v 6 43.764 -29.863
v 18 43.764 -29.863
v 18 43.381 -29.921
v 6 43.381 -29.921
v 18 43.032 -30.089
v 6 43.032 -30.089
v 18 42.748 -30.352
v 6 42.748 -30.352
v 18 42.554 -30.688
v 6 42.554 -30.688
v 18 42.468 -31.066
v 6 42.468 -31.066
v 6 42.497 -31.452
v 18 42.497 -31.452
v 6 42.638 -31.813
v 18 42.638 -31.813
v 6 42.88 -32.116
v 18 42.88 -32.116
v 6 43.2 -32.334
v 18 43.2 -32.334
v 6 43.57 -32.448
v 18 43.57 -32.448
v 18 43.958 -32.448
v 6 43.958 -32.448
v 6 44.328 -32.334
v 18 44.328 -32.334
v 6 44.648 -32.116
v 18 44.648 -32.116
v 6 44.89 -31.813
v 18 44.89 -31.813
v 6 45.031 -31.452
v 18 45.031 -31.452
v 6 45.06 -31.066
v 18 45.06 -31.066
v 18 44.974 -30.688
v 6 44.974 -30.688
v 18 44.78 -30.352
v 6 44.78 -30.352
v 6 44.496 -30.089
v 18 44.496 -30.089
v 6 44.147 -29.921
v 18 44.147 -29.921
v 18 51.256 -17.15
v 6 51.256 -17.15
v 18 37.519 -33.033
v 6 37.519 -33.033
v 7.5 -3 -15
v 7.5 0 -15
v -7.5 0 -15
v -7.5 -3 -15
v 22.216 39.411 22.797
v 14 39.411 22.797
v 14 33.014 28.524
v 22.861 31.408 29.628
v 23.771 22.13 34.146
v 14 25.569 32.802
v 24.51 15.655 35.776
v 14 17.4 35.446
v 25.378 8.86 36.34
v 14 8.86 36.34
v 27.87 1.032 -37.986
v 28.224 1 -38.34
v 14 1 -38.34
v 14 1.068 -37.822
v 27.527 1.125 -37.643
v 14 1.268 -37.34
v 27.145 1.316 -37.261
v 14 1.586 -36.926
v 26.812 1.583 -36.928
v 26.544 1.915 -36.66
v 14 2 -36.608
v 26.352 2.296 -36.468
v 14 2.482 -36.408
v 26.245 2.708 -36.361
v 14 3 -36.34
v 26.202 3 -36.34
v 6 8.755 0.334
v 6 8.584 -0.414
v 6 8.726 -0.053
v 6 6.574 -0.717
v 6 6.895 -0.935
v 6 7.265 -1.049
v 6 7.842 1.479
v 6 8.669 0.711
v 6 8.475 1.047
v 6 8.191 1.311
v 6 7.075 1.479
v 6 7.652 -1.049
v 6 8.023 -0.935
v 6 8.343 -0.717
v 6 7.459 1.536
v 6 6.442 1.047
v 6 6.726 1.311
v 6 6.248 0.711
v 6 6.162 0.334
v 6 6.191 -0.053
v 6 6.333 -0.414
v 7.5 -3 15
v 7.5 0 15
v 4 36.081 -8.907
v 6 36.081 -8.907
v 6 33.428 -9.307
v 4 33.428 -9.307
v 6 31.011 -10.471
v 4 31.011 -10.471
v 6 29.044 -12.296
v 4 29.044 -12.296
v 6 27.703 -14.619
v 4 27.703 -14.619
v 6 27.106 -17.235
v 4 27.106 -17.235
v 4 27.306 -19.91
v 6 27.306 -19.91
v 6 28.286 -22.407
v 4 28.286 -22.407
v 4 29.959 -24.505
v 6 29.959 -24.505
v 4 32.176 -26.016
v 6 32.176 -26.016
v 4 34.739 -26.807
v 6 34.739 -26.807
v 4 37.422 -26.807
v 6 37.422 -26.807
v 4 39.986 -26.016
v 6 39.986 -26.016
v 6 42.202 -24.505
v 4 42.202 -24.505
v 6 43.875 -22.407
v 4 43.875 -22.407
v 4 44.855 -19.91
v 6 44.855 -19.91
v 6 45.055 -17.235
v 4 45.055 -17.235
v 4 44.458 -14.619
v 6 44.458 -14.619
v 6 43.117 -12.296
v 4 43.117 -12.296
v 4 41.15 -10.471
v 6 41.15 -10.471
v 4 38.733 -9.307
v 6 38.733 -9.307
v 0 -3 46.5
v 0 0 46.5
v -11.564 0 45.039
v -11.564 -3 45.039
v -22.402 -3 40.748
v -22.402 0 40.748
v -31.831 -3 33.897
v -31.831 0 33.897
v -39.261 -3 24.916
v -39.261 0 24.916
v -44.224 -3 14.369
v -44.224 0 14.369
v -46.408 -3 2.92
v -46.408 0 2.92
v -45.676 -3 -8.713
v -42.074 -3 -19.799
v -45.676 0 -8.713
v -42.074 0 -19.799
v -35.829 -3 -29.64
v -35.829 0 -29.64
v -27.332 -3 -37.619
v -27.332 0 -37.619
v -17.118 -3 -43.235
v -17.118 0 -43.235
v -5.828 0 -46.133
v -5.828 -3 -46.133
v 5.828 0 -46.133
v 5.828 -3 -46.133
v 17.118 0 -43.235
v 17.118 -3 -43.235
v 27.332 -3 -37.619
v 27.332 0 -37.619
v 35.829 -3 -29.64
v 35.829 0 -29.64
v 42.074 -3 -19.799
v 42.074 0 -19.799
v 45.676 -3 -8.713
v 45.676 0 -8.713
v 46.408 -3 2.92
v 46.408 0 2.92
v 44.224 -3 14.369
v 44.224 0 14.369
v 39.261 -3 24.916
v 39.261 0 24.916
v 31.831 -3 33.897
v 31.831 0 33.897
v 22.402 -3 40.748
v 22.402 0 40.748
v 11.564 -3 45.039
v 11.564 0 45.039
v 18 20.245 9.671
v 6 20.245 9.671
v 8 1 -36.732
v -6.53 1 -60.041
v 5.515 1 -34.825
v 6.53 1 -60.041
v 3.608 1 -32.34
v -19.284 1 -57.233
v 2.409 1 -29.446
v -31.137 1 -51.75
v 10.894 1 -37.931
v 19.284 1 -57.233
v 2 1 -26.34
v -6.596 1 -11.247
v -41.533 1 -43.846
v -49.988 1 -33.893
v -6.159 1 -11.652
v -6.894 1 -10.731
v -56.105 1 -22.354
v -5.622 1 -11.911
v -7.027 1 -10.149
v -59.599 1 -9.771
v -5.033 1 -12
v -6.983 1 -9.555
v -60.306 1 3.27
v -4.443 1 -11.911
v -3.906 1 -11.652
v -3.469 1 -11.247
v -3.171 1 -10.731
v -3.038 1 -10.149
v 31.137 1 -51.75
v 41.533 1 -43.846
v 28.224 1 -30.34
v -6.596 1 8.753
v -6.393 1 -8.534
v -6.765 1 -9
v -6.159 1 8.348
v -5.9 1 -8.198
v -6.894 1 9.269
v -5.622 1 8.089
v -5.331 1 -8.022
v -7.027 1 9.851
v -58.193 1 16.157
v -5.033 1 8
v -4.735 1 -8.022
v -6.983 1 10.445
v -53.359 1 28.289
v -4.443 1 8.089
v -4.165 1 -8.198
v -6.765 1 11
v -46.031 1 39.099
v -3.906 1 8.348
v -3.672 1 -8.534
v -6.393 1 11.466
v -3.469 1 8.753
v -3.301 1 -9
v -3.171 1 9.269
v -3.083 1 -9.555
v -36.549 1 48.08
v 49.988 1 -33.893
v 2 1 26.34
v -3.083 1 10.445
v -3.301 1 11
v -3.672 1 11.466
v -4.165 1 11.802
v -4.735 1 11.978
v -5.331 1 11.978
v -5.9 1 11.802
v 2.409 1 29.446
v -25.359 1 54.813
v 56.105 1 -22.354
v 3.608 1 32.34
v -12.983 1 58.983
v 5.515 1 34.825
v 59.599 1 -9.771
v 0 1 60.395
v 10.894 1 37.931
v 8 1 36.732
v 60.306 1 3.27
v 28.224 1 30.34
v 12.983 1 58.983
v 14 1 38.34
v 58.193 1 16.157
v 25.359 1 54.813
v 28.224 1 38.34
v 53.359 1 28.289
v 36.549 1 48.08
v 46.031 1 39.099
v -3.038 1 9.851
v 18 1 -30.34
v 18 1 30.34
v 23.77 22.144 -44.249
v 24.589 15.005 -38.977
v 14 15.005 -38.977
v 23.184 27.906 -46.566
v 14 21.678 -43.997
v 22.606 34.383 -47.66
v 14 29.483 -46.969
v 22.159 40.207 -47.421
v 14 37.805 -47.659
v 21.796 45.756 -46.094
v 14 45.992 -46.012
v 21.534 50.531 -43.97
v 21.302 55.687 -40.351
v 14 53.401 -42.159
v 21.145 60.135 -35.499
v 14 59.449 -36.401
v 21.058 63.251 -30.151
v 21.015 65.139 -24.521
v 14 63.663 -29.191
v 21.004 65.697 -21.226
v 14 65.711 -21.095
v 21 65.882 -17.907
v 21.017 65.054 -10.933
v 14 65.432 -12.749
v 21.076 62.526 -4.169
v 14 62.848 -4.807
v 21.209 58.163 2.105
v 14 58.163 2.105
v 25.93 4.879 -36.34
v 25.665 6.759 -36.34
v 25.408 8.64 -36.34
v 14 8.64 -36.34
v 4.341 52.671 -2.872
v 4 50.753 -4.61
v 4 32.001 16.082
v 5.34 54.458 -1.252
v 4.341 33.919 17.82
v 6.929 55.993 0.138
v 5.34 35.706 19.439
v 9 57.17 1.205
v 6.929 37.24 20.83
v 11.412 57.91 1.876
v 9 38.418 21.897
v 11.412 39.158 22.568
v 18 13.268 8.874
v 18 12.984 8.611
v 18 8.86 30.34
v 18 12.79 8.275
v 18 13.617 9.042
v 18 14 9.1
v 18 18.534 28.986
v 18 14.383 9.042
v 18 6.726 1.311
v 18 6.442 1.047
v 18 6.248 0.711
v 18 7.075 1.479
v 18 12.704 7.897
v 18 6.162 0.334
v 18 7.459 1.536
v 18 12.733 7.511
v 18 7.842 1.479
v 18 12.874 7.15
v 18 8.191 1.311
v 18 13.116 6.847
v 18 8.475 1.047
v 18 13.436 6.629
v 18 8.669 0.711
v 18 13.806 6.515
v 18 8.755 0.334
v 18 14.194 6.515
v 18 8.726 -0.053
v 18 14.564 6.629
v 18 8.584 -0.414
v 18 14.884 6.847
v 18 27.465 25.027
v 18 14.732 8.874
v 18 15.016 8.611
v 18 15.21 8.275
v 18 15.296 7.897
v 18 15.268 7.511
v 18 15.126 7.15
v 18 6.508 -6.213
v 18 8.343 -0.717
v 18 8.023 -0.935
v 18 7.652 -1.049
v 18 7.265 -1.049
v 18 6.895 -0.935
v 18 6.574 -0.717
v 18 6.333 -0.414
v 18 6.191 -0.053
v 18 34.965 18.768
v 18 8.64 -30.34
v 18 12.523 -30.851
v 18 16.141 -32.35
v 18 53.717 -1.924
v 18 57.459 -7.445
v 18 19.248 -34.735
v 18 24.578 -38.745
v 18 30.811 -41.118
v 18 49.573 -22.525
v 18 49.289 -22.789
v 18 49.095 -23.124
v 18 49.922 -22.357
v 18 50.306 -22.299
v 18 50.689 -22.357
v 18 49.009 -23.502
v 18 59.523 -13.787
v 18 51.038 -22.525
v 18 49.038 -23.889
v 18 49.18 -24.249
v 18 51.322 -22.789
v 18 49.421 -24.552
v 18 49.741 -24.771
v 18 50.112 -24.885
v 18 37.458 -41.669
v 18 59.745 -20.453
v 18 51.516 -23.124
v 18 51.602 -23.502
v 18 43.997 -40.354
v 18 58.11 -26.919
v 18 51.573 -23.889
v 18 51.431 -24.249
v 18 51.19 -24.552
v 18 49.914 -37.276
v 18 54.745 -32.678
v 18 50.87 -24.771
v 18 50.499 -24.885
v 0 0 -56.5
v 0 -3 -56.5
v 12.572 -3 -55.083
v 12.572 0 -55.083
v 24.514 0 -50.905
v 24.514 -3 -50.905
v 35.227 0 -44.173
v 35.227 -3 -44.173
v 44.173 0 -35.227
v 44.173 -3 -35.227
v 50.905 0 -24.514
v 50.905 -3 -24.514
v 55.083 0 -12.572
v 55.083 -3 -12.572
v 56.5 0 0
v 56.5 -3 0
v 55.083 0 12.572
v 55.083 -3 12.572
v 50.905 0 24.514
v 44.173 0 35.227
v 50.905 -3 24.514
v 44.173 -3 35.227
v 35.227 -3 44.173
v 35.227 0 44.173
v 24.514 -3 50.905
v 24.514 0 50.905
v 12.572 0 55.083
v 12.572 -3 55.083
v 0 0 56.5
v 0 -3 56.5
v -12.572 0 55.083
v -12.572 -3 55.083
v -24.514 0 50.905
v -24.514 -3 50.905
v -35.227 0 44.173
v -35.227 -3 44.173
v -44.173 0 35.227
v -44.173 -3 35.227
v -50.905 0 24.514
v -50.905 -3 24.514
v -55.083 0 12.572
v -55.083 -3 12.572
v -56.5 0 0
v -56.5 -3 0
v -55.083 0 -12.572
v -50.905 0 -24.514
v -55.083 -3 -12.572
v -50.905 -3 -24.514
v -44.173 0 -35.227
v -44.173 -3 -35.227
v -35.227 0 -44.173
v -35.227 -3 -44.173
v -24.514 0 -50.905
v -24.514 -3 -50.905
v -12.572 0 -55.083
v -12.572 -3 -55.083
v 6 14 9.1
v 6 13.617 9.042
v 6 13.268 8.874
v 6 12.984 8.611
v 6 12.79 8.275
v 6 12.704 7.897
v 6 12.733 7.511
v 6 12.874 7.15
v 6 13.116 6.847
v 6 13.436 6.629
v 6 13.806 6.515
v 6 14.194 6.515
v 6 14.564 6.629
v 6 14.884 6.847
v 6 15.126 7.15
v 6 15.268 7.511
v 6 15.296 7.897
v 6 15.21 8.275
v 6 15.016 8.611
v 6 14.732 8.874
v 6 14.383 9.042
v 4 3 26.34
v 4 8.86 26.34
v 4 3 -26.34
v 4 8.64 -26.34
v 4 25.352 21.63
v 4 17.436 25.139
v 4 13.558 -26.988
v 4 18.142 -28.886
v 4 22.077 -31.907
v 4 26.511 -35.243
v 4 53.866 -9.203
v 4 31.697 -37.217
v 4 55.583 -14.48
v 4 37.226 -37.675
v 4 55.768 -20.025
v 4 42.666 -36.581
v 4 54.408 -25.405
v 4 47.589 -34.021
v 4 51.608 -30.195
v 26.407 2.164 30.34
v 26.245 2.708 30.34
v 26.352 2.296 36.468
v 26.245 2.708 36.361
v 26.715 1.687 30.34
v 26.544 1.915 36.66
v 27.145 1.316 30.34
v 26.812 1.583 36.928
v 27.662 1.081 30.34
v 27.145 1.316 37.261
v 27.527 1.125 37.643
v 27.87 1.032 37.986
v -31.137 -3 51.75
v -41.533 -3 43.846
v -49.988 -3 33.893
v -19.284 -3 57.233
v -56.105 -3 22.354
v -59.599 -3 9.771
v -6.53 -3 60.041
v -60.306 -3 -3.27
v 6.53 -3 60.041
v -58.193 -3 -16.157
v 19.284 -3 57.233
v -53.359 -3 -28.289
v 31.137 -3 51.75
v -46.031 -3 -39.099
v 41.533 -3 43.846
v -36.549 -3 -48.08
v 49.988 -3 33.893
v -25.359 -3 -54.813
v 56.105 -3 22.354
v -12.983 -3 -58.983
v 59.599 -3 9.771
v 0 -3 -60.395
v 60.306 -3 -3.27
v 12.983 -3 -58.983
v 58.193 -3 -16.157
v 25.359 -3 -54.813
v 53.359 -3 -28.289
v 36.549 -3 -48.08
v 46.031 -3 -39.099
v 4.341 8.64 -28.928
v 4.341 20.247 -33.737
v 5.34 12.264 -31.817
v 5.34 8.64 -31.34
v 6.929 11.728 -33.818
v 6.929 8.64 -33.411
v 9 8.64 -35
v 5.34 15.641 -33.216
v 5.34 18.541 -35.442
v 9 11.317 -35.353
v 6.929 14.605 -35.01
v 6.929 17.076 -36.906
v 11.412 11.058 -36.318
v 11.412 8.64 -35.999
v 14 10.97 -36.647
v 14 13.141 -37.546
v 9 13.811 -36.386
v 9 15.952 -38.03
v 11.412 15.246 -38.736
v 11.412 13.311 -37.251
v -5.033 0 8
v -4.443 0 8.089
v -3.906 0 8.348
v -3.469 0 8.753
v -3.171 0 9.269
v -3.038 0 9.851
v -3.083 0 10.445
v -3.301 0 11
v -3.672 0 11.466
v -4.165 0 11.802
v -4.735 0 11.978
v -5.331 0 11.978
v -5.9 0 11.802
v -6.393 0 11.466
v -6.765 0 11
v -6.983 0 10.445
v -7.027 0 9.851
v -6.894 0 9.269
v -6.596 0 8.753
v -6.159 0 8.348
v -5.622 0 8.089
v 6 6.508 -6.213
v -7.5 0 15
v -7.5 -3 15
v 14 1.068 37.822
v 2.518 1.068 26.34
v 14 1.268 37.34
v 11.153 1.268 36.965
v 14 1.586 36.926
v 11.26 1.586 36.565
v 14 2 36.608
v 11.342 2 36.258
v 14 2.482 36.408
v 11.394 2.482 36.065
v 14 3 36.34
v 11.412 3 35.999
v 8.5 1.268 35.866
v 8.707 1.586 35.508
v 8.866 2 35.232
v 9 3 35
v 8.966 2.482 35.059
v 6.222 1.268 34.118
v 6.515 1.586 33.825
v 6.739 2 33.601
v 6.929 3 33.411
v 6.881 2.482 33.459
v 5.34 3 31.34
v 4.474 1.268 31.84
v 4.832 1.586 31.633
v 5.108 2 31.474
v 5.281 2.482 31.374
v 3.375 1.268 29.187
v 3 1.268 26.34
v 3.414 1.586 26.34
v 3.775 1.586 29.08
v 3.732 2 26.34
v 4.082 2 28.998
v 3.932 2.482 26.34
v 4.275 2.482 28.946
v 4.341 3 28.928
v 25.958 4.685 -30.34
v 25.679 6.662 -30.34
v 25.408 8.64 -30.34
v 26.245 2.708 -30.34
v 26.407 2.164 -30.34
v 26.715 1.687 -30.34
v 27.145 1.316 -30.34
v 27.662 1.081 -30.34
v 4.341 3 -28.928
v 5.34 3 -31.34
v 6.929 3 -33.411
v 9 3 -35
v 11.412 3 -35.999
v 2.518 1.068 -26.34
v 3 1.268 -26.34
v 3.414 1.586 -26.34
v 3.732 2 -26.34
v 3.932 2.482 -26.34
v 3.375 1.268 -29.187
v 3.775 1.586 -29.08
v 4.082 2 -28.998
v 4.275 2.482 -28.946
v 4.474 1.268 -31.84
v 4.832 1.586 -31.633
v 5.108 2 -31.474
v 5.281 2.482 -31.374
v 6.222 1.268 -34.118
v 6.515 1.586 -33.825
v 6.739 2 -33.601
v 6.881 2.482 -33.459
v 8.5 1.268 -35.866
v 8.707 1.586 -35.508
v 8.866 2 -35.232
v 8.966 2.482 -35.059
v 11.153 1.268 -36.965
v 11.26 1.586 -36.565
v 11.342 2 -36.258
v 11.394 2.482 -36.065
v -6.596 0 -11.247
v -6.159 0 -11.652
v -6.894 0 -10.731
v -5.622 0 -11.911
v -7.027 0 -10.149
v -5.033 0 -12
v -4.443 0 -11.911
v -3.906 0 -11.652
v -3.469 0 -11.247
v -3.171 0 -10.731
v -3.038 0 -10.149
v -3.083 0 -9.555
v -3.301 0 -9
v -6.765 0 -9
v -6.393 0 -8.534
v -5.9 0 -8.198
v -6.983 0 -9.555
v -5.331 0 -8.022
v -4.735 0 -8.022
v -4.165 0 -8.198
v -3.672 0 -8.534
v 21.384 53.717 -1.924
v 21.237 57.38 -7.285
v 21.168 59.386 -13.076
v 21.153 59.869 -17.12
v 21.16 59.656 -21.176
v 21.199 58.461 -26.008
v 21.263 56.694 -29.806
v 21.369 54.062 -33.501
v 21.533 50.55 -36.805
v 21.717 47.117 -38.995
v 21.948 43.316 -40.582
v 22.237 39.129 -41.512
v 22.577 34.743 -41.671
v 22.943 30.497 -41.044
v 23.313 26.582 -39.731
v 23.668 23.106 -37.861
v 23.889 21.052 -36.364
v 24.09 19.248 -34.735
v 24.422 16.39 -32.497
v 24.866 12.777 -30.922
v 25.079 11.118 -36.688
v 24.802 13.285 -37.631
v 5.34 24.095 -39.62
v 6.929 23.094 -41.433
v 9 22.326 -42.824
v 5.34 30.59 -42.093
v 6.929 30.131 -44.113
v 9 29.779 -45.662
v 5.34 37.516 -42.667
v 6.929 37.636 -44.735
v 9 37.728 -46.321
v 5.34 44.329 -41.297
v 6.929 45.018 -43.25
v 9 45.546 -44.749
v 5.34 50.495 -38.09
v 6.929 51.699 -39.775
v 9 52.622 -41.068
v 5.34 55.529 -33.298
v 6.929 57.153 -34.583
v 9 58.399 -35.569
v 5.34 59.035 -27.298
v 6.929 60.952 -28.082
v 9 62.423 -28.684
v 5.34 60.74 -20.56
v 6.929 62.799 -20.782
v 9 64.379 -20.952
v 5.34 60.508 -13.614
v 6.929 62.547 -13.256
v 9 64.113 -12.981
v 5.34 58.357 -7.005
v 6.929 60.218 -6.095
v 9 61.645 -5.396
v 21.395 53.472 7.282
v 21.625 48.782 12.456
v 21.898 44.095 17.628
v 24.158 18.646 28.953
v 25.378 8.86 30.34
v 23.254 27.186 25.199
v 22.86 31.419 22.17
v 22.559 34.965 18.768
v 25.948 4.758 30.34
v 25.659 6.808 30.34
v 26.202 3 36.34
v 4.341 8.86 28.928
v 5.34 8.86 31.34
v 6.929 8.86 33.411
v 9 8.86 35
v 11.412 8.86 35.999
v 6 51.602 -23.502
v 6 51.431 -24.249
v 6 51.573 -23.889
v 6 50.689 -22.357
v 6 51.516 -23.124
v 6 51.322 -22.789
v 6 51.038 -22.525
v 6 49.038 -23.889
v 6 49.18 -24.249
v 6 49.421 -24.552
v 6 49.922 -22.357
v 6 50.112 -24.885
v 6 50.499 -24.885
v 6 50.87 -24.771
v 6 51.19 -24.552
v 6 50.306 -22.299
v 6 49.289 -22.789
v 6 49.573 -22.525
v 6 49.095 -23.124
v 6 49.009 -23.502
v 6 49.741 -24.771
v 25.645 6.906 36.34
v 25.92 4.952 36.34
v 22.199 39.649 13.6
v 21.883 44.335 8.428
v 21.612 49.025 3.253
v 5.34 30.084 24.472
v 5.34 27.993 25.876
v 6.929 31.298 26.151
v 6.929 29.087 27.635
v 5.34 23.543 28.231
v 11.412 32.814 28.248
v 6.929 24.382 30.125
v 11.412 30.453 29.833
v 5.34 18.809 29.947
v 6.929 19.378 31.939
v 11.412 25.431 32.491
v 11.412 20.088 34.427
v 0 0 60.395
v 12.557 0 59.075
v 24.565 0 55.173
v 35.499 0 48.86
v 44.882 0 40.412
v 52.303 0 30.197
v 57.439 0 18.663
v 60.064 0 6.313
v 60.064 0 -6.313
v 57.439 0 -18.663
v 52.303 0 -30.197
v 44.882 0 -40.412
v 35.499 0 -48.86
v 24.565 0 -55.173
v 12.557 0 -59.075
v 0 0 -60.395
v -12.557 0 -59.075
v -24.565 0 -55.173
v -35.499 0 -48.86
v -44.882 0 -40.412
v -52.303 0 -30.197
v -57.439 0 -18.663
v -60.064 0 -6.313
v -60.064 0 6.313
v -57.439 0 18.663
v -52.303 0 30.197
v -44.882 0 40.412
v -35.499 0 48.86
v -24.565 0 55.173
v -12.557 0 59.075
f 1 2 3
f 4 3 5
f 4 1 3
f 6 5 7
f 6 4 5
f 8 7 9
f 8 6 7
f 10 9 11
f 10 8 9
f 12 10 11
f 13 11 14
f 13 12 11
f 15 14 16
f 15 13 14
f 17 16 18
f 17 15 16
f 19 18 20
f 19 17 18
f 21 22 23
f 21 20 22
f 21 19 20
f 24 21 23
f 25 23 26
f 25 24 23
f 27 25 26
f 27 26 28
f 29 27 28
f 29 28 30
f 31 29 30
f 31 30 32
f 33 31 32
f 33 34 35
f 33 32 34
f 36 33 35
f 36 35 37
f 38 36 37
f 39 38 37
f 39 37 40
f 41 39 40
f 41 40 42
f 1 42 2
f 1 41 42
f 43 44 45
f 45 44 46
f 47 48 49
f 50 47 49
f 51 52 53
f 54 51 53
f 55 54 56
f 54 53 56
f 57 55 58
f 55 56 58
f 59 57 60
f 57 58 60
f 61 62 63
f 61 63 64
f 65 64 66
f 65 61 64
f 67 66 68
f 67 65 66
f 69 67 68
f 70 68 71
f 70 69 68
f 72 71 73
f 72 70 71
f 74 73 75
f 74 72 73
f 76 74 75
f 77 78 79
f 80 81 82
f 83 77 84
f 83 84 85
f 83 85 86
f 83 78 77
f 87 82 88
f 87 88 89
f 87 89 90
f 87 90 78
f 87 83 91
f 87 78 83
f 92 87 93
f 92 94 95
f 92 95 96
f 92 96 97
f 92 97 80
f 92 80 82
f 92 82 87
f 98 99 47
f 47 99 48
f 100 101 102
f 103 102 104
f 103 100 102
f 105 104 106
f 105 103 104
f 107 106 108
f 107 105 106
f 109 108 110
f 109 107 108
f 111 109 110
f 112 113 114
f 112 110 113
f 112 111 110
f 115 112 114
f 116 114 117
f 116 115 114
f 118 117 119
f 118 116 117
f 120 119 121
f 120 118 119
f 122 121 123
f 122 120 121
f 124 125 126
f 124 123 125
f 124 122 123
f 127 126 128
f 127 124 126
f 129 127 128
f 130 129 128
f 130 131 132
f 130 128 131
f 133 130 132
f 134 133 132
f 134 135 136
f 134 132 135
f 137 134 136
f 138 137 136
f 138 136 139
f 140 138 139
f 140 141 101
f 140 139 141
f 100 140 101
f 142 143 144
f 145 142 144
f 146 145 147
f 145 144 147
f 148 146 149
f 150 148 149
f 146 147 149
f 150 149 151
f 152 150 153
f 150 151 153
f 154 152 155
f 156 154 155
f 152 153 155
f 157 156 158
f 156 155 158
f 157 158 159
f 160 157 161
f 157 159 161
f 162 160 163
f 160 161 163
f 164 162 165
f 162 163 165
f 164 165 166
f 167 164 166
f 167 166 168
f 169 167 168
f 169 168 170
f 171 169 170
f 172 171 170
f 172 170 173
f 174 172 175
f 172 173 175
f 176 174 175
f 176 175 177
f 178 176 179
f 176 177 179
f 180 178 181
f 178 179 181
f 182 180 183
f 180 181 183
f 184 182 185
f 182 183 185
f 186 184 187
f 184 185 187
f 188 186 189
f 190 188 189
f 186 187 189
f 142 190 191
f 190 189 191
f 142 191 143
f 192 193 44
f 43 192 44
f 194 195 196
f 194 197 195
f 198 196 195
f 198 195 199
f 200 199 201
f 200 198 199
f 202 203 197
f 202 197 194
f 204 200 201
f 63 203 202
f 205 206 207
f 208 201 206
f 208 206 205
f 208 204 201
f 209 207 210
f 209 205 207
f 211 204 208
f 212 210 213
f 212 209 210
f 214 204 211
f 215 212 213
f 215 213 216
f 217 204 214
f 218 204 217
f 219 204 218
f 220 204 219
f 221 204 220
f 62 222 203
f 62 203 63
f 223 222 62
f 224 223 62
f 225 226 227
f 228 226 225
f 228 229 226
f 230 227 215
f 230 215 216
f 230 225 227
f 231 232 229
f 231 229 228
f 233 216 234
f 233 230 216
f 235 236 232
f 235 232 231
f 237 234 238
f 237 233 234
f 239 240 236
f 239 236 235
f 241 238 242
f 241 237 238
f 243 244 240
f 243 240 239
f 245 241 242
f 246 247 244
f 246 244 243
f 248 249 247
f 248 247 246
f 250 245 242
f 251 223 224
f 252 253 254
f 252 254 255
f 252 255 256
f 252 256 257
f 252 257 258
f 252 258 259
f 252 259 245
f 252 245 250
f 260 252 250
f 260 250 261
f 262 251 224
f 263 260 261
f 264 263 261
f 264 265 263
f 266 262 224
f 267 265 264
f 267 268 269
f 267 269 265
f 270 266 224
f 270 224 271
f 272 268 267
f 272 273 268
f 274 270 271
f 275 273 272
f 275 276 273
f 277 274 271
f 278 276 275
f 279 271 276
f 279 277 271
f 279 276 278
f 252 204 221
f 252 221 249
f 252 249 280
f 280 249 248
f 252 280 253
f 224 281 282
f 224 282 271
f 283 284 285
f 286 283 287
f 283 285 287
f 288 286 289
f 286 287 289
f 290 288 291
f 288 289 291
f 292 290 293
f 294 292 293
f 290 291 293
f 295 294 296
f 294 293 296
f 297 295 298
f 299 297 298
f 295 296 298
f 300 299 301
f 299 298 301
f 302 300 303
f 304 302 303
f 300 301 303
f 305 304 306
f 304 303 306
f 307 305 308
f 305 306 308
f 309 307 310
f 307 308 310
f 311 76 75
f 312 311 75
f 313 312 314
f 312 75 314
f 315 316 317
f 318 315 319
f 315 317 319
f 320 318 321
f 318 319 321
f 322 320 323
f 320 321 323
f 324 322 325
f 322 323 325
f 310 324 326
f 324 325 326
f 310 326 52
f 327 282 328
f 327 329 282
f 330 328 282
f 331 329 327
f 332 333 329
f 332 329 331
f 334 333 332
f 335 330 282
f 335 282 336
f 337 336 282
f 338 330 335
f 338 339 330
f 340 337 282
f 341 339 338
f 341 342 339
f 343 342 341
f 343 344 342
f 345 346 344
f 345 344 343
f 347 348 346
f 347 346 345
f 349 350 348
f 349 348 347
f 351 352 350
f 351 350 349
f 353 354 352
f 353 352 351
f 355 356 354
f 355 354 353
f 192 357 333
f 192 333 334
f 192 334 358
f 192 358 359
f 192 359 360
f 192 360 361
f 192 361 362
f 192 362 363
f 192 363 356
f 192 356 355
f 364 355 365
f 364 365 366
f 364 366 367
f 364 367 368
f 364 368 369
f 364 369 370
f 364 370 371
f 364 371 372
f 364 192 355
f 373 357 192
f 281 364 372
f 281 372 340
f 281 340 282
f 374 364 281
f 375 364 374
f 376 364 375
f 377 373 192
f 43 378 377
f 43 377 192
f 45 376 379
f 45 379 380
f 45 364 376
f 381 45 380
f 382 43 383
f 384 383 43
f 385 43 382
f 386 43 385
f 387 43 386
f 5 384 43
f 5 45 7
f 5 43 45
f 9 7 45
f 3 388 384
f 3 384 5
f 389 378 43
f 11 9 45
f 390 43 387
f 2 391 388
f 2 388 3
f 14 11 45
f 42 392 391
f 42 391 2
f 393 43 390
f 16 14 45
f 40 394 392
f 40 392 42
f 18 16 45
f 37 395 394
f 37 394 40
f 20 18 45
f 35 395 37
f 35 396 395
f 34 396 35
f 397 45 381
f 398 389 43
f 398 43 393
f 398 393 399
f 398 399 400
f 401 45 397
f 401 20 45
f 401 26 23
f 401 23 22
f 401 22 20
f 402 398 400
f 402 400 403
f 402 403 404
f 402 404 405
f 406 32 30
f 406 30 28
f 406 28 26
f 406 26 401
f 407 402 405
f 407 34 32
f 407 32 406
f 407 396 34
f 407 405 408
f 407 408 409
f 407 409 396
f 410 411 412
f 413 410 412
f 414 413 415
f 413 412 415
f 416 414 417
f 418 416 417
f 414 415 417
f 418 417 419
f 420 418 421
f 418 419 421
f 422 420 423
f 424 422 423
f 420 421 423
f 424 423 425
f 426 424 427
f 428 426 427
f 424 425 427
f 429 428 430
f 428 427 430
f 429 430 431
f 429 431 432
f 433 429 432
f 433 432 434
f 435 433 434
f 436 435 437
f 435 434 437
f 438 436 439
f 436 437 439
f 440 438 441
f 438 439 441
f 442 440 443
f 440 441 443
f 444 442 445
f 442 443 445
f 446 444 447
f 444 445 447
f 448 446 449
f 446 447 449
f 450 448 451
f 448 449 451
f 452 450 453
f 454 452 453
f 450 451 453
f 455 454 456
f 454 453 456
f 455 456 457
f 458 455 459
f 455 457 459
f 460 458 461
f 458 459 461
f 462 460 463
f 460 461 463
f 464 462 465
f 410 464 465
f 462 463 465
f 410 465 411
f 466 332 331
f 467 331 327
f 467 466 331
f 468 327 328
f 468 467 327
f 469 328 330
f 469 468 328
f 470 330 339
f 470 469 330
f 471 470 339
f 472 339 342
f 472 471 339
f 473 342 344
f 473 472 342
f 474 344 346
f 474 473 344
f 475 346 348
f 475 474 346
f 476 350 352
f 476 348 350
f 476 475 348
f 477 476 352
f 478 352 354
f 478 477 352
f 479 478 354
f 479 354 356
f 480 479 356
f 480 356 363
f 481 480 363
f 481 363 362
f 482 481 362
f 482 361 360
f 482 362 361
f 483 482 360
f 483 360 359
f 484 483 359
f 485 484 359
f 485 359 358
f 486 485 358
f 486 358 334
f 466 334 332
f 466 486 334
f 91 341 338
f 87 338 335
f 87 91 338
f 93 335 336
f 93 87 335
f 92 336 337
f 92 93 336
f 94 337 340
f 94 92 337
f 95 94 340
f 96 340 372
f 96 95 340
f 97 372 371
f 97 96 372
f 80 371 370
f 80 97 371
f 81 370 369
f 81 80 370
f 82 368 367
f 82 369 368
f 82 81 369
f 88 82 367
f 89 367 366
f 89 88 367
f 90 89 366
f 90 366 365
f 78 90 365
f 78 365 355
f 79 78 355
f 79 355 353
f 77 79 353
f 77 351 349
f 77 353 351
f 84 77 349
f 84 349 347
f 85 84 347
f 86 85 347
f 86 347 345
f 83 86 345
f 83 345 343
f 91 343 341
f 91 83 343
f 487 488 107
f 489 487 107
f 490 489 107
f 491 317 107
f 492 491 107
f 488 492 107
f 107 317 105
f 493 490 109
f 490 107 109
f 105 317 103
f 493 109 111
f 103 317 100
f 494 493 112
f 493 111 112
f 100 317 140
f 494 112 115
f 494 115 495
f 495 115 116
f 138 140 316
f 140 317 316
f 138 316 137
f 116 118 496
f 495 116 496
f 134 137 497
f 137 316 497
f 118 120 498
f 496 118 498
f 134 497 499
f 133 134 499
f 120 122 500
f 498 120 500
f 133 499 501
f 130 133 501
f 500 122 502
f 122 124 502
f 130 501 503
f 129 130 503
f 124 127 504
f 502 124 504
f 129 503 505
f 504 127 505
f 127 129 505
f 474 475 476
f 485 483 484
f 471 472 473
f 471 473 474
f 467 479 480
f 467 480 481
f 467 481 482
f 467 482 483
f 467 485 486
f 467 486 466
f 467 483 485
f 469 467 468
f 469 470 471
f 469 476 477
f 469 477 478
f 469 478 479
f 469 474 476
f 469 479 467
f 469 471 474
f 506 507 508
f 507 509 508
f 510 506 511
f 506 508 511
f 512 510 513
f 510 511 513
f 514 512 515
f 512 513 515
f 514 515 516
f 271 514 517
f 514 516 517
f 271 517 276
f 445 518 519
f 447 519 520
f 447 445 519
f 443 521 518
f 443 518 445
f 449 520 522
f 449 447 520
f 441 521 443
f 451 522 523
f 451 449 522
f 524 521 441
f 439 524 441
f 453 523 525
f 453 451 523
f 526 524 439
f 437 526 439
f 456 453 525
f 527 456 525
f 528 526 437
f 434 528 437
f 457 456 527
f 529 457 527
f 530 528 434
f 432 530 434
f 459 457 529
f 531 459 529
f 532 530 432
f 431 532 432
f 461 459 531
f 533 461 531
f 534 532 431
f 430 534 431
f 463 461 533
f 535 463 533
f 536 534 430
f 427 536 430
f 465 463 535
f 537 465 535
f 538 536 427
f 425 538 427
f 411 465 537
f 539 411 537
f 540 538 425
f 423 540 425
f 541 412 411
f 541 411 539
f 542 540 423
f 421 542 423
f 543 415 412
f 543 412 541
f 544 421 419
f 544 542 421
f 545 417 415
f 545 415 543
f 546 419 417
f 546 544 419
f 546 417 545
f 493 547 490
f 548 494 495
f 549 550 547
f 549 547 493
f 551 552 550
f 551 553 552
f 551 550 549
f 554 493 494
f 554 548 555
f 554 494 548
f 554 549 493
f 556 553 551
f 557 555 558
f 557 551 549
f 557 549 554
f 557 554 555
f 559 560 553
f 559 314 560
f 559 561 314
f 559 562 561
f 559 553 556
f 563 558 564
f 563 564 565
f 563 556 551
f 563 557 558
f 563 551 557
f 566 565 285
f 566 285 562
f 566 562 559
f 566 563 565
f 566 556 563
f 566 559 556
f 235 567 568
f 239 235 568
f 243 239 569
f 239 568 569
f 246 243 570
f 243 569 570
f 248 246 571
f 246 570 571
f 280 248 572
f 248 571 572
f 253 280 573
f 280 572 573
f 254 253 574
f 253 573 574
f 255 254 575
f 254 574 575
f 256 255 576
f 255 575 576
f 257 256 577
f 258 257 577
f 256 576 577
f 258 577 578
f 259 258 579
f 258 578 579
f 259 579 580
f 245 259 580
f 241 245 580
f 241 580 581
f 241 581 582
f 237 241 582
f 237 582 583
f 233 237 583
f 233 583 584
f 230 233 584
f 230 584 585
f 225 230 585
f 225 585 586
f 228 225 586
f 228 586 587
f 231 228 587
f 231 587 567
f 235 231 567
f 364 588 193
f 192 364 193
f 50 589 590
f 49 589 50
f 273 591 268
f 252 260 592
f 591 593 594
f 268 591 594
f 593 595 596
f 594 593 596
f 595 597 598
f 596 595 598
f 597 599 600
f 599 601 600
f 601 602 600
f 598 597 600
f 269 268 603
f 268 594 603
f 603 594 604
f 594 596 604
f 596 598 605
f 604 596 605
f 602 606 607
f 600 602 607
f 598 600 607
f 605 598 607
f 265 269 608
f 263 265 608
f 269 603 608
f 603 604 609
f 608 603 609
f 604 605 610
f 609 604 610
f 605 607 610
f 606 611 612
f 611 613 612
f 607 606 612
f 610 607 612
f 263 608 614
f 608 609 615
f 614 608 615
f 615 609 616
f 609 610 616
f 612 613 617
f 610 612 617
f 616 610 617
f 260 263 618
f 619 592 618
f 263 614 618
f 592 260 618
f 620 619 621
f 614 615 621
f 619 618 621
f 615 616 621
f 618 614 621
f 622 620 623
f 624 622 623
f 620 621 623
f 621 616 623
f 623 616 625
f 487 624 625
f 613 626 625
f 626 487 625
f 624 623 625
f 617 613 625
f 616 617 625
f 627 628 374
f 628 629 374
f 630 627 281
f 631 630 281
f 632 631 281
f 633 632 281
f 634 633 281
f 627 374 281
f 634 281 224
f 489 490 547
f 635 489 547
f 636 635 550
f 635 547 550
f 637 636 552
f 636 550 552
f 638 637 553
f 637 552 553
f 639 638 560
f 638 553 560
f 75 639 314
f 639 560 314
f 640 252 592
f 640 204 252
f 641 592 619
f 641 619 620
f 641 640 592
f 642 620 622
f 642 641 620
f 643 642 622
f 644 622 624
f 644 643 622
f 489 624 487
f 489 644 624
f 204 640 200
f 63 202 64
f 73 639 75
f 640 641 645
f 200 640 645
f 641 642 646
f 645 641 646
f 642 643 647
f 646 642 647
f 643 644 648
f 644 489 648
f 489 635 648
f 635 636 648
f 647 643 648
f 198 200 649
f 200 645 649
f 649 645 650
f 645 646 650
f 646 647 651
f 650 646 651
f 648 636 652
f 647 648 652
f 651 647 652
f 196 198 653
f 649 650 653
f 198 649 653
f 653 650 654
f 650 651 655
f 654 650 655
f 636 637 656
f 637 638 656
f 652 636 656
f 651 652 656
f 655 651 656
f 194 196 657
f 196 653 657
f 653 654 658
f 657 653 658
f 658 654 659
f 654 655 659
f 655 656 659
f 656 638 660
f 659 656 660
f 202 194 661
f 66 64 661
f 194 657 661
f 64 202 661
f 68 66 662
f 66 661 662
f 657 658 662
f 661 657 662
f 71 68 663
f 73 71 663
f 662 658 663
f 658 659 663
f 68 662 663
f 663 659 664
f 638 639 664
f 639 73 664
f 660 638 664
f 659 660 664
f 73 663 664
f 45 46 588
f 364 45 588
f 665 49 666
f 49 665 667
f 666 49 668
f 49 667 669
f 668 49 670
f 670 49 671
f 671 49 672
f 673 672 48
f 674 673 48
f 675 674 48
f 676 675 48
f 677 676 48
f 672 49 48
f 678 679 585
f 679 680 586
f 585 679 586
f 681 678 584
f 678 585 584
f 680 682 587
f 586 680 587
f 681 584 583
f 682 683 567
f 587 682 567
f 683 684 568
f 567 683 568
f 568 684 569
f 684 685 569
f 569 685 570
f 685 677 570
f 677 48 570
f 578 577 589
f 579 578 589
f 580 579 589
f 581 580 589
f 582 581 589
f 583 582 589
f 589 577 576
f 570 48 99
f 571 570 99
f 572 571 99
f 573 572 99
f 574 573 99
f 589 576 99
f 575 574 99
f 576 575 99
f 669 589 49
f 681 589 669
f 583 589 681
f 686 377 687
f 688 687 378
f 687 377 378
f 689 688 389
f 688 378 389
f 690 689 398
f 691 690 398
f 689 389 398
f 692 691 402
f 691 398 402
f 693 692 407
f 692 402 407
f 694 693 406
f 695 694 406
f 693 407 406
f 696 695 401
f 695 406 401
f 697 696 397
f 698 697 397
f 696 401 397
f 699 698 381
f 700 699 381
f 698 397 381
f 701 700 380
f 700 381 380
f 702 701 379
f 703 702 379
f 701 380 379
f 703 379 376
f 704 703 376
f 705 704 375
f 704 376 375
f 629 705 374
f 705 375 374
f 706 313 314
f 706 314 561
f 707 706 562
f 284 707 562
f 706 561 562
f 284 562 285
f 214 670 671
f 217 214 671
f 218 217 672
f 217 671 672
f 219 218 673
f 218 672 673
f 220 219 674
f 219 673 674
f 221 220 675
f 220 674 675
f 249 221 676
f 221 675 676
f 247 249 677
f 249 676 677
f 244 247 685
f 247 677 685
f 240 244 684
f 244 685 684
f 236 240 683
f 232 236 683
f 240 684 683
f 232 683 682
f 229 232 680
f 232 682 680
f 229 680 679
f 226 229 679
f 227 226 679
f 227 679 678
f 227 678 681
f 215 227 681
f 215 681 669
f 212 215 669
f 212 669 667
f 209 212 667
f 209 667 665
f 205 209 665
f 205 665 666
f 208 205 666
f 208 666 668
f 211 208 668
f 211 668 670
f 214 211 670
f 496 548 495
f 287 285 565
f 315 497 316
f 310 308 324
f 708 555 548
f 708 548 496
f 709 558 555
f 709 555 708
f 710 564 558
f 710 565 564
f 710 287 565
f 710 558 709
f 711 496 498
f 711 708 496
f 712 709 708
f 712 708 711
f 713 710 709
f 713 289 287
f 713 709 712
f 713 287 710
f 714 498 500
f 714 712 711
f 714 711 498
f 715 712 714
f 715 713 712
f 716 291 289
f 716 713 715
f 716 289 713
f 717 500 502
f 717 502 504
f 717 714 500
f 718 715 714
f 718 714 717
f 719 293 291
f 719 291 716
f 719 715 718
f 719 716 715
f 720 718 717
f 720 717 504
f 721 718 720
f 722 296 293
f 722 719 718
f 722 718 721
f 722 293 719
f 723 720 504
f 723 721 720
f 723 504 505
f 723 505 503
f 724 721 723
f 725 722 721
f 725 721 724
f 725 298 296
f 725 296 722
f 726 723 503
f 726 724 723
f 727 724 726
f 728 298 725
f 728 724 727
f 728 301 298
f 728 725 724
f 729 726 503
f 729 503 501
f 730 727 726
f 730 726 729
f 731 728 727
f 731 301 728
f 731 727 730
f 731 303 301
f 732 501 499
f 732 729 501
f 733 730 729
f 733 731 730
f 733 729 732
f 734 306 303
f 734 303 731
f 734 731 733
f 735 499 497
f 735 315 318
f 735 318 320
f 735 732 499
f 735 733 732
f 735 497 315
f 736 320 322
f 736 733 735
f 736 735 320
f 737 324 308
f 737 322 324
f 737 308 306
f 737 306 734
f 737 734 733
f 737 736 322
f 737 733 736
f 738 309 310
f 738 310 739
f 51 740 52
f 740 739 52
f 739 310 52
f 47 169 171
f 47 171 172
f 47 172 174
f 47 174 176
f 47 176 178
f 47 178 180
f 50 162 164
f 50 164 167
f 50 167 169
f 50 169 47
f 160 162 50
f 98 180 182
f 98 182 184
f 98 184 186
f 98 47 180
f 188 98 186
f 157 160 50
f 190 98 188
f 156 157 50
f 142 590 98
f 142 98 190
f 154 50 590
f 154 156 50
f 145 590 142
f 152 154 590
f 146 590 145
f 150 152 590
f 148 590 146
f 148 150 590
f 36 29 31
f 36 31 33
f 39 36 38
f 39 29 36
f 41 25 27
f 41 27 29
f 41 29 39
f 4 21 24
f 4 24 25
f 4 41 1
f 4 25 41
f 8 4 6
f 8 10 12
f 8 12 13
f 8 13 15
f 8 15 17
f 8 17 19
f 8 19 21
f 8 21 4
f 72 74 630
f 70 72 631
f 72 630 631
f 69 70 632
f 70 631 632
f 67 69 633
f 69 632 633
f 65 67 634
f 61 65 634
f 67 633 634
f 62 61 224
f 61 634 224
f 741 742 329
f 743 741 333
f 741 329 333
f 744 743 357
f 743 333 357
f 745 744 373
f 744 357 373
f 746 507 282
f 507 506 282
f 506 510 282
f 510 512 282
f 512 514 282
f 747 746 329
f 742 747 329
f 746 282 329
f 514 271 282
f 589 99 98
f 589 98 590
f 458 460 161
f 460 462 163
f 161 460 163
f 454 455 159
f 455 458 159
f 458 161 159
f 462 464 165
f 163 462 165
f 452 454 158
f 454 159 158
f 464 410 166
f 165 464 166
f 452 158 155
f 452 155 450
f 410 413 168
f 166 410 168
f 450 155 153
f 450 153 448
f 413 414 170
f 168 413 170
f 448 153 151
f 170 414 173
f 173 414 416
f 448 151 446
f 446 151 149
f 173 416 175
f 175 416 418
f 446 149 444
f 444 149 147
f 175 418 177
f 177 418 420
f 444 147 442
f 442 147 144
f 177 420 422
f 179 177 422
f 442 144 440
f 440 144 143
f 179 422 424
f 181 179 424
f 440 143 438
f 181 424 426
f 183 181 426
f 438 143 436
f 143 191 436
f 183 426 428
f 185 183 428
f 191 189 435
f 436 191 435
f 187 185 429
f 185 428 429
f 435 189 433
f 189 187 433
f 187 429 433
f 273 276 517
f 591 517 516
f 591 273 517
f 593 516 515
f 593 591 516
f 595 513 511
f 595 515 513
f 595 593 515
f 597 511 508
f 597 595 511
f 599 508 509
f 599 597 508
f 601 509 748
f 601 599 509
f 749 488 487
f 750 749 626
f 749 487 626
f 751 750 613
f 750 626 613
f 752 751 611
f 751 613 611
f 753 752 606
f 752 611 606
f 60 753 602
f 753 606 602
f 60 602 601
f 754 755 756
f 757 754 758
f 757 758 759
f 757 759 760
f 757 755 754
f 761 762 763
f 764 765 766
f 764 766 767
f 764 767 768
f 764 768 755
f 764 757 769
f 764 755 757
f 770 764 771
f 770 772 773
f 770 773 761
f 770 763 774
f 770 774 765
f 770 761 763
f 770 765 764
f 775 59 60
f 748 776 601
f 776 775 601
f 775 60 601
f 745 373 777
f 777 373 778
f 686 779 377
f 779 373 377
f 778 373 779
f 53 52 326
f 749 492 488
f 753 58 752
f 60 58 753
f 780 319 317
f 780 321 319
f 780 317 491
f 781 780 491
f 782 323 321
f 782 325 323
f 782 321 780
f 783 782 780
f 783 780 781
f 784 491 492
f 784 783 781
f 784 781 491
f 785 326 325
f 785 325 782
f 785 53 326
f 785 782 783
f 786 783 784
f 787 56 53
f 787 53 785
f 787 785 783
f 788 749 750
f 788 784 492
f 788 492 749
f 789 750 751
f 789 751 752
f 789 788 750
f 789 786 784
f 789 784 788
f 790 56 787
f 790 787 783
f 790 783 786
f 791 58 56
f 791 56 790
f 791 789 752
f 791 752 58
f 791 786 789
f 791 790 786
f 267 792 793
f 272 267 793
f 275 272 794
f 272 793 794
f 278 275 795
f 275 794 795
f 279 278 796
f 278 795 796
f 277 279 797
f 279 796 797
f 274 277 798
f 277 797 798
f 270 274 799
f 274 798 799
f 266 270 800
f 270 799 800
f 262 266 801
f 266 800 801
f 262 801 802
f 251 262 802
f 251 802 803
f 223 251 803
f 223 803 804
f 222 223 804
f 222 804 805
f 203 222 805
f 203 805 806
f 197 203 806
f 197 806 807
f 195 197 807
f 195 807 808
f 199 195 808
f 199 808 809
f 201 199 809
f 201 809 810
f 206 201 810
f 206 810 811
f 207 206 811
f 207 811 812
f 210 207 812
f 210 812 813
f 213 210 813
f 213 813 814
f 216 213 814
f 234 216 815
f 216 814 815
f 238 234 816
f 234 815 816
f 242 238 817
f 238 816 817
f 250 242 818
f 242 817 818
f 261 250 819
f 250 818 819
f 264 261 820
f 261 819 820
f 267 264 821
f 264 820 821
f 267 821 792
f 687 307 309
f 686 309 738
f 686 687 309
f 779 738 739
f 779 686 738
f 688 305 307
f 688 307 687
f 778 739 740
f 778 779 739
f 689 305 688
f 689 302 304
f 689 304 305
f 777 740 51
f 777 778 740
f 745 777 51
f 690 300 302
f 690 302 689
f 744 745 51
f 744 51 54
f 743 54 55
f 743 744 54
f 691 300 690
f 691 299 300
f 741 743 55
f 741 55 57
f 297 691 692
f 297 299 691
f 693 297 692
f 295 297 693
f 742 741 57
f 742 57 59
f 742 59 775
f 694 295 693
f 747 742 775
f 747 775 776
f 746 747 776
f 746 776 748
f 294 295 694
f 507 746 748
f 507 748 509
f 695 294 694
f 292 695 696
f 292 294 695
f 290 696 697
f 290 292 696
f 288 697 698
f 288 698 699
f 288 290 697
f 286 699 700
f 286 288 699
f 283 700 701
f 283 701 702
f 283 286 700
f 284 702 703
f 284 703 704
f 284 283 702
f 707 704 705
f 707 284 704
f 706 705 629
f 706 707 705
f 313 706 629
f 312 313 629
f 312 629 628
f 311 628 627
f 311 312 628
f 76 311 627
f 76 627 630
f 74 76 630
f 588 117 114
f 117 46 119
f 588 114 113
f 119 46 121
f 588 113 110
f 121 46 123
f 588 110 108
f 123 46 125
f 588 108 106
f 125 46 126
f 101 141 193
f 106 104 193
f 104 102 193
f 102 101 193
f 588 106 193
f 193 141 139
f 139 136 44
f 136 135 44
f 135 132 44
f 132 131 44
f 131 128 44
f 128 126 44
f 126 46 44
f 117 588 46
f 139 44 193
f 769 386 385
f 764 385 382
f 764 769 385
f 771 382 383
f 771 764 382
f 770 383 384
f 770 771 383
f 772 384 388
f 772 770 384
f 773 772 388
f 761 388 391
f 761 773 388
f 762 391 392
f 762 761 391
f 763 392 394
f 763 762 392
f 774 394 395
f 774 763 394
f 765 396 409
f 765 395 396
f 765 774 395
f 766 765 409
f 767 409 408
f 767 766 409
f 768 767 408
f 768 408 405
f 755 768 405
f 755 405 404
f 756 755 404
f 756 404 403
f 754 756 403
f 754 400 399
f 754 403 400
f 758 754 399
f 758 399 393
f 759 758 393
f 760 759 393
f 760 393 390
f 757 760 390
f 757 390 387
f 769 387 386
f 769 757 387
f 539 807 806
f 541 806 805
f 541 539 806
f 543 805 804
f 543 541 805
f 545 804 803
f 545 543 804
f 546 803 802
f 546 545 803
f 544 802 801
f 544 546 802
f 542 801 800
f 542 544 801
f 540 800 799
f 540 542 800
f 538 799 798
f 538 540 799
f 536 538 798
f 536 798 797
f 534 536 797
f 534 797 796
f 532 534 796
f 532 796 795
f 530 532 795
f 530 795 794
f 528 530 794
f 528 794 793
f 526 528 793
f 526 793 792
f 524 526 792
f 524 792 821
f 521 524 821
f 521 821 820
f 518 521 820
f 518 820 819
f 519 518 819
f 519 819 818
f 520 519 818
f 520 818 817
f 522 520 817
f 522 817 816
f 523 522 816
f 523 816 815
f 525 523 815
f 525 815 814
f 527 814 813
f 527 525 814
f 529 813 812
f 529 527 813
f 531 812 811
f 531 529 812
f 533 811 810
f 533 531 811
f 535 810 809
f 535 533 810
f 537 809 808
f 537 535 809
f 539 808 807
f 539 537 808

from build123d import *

# Parameters (mm, degrees)
SKETCH1_R                = 60.394691442
BOSS_EXTRUDE1_DEPTH      = 1
BOSS_EXTRUDE3_START      = 4
SKETCH3_R                = 9
BOSS_EXTRUDE3_DEPTH      = 14
CUT_EXTRUDE1_START       = 6
SKETCH4_R                = 1.3
CUT_EXTRUDE1_DEPTH       = 99.311500824
BOSS_EXTRUDE4_DEPTH      = 9
BOSS_EXTRUDE4_DEPTH_BACK = 14
CUT_EXTRUDE2_DEPTH       = 108.867849616
CUT_EXTRUDE2_DEPTH_BACK  = 108.867849616
FILLET1_R                = 10
FILLET3_R                = 2
BOSS_EXTRUDE9_START      = 3
SKETCH11_R               = 60.394691442
SKETCH11_R_2             = 56.5
BOSS_EXTRUDE9_DEPTH      = 3
SKETCH14_R               = 46.5
SKETCH14_W               = 15
SKETCH14_H               = 30
BOSS_EXTRUDE12_DEPTH     = 3
SKETCH16_R               = 2
CUT_EXTRUDE3_DEPTH       = 4


with BuildPart() as part:
    # Sketch1 → Boss-Extrude1 (new body)
    with BuildSketch(Plane(origin=(0, 0, 0), x_dir=(1, 0, 0), z_dir=(0, 1, 0))):
        with Locations(Location((0, 0, 0), (0, 0, 270))):
            Circle(SKETCH1_R)
    extrude(amount=BOSS_EXTRUDE1_DEPTH)

    # Sketch3 → Boss-Extrude3 (add)
    with BuildSketch(Plane(origin=(0, 0, 0), x_dir=(0, 0, -1), z_dir=(1, 0, 0)).offset(BOSS_EXTRUDE3_START)):
        with BuildLine():
            Line((-30.34, 1), (30.34, 1))
            Line((30.34, 1), (30.34, 8.64))
            ThreePointArc((30.34, 8.64), (31.482215556, 14.381237698), (34.73490804, 19.248111261))
            ThreePointArc((34.73490804, 19.248111261), (35.146816919, 52.490993137), (1.923997232, 53.717009602))
            Line((1.923997232, 53.717009602), (-18.767804398, 34.964811646))
            ThreePointArc((-18.767804398, 34.964811646), (-27.317276732, 23.137402619), (-30.34, 8.86))
            Line((-30.34, 8.86), (-30.34, 1))
        make_face()
        with Locations(Location((17.907195719, 36.080614483, 0), (0, 0, 180))):
            Circle(SKETCH3_R, mode=Mode.SUBTRACT)
    extrude(amount=BOSS_EXTRUDE3_DEPTH)

    # Sketch4 → Cut-Extrude1 (cut, through all)
    with BuildSketch(Plane(origin=(0, 0, 0), x_dir=(0, 0, -1), z_dir=(1, 0, 0)).offset(CUT_EXTRUDE1_START)):
        with Locations(Location((23.599251188, 50.305537875, 0), (0, 0, 180))):
            Circle(SKETCH4_R)
        with Locations(Location((31.162882913, 43.764018545, 0), (0, 0, 180))):
            Circle(SKETCH4_R)
        with Locations(Location((-0.236409868, 7.458586268, 0), (0, 0, 180))):
            Circle(SKETCH4_R)
        with Locations(Location((-7.800041592, 14.000105597, 0), (0, 0, 180))):
            Circle(SKETCH4_R)
        Polygon((17.149721975, 51.256102402), (33.033348596, 37.518911811), (6.213119346, 6.50802174), (-9.670507276, 20.245212332), align=None)
    extrude(amount=CUT_EXTRUDE1_DEPTH, mode=Mode.SUBTRACT)

    # Sketch8 → Boss-Extrude4 (add, two sides: drawn at the far end of the back side and taken through both)
    with BuildSketch(Plane(origin=(18, 0, 0), x_dir=(0, 0, -1), z_dir=(1, 0, 0)).offset(-BOSS_EXTRUDE4_DEPTH_BACK)):
        with BuildLine():
            Line((-30.34, 1), (-30.34, 8.86))
            ThreePointArc((-30.34, 8.86), (-27.317276732, 23.137402619), (-18.767804398, 34.964811646))
            Line((-18.767804398, 34.964811646), (1.923997232, 53.717009602))
            ThreePointArc((1.923997232, 53.717009602), (35.146816919, 52.490993137), (34.73490804, 19.248111261))
            ThreePointArc((34.73490804, 19.248111261), (31.482215556, 14.381237698), (30.34, 8.64))
            Line((30.34, 8.64), (30.34, 1))
            Line((30.34, 1), (36.34, 1))
            Line((36.34, 1), (36.34, 8.64))
            ThreePointArc((36.34, 8.64), (37.025329334, 12.084742619), (38.976944824, 15.004866757))
            ThreePointArc((38.976944824, 15.004866757), (39.492690314, 56.627825795), (-2.105149131, 58.162904291))
            Line((-2.105149131, 58.162904291), (-22.796950761, 39.410706335))
            ThreePointArc((-22.796950761, 39.410706335), (-32.802478559, 25.568978426), (-36.34, 8.86))
            Line((-36.34, 8.86), (-36.34, 1))
            Line((-36.34, 1), (-30.34, 1))
        make_face()
    extrude(amount=BOSS_EXTRUDE4_DEPTH + BOSS_EXTRUDE4_DEPTH_BACK)

    # Sketch10 → Cut-Extrude2 (cut, two sides: drawn at the far end of the back side and taken through both)
    with BuildSketch(Plane.XY.offset(-CUT_EXTRUDE2_DEPTH_BACK)):
        with BuildLine():
            Line((27, 65.881981391), (21, 65.881981391))
            ThreePointArc((21, 65.881981391), (22.692685718, 33.351362906), (26.5, 1))
            Line((26.5, 1), (27, 1))
            Line((27, 1), (27, 65.881981391))
        make_face()
    extrude(amount=CUT_EXTRUDE2_DEPTH + CUT_EXTRUDE2_DEPTH_BACK, mode=Mode.SUBTRACT)

    # Fillet1
    fillet1_edges = [part.edges().sort_by_distance(p)[0] for p in [
        (4, 12.084742619, -37.025329334),
        (4, 25.568978426, 32.802478559),
        (4, 4.93, 36.34),
        (4, 4.82, -36.34),
        (4, 56.627825795, -39.492690314),
        (4, 48.786805313, 12.451049946),
    ]]
    fillet(fillet1_edges, radius=FILLET1_R)

    # Fillet3
    fillet3_edges = [part.edges().sort_by_distance(p)[0] for p in [
        (20.25, 1, -36.34),
        (6.928932188, 1, -33.411067812),
        (4, 1, 0),
        (6.928932188, 1, 33.411067812),
        (20.25, 1, 36.34),
    ]]
    fillet(fillet3_edges, radius=FILLET3_R)
    fillet3_2_edges = [part.edges().sort_by_distance(p)[0] for p in [
        (26.5, 1, -33.34),
    ]]
    fillet(fillet3_2_edges, radius=FILLET3_R)
    fillet3_3_edges = [part.edges().sort_by_distance(p)[0] for p in [
        (26.5, 1, 33.34),
    ]]
    fillet(fillet3_3_edges, radius=FILLET3_R)

    # Sketch11 → Boss-Extrude9 (add)
    with BuildSketch(Plane.XZ.offset(BOSS_EXTRUDE9_START)):
        with Locations(Location((0, 0, 0), (0, 0, 270))):
            Circle(SKETCH11_R)
        with Locations(Location((0, 0, 0), (0, 0, 270))):
            Circle(SKETCH11_R_2, mode=Mode.SUBTRACT)
    extrude(amount=-BOSS_EXTRUDE9_DEPTH)

    # Sketch14 → Boss-Extrude12 (add)
    with BuildSketch(Plane(origin=(0, 0, 0), x_dir=(-1, 0, 0), z_dir=(0, -1, 0))):
        with Locations(Location((0, 0, 0), (0, 0, 270))):
            Circle(SKETCH14_R)
        Rectangle(SKETCH14_W, SKETCH14_H, mode=Mode.SUBTRACT)
    extrude(amount=BOSS_EXTRUDE12_DEPTH)

    # Sketch16 → Cut-Extrude3 (cut)
    with BuildSketch(Plane(origin=(0, 0, 0), x_dir=(-1, 0, 0), z_dir=(0, -1, 0))):
        with Locations(Location((5.032683159, 10, 0), (0, 0, 90))):
            Circle(SKETCH16_R)
        with Locations(Location((5.032683159, -10, 0), (0, 0, 90))):
            Circle(SKETCH16_R)
    extrude(amount=-CUT_EXTRUDE3_DEPTH, mode=Mode.SUBTRACT)


solid = part.part
